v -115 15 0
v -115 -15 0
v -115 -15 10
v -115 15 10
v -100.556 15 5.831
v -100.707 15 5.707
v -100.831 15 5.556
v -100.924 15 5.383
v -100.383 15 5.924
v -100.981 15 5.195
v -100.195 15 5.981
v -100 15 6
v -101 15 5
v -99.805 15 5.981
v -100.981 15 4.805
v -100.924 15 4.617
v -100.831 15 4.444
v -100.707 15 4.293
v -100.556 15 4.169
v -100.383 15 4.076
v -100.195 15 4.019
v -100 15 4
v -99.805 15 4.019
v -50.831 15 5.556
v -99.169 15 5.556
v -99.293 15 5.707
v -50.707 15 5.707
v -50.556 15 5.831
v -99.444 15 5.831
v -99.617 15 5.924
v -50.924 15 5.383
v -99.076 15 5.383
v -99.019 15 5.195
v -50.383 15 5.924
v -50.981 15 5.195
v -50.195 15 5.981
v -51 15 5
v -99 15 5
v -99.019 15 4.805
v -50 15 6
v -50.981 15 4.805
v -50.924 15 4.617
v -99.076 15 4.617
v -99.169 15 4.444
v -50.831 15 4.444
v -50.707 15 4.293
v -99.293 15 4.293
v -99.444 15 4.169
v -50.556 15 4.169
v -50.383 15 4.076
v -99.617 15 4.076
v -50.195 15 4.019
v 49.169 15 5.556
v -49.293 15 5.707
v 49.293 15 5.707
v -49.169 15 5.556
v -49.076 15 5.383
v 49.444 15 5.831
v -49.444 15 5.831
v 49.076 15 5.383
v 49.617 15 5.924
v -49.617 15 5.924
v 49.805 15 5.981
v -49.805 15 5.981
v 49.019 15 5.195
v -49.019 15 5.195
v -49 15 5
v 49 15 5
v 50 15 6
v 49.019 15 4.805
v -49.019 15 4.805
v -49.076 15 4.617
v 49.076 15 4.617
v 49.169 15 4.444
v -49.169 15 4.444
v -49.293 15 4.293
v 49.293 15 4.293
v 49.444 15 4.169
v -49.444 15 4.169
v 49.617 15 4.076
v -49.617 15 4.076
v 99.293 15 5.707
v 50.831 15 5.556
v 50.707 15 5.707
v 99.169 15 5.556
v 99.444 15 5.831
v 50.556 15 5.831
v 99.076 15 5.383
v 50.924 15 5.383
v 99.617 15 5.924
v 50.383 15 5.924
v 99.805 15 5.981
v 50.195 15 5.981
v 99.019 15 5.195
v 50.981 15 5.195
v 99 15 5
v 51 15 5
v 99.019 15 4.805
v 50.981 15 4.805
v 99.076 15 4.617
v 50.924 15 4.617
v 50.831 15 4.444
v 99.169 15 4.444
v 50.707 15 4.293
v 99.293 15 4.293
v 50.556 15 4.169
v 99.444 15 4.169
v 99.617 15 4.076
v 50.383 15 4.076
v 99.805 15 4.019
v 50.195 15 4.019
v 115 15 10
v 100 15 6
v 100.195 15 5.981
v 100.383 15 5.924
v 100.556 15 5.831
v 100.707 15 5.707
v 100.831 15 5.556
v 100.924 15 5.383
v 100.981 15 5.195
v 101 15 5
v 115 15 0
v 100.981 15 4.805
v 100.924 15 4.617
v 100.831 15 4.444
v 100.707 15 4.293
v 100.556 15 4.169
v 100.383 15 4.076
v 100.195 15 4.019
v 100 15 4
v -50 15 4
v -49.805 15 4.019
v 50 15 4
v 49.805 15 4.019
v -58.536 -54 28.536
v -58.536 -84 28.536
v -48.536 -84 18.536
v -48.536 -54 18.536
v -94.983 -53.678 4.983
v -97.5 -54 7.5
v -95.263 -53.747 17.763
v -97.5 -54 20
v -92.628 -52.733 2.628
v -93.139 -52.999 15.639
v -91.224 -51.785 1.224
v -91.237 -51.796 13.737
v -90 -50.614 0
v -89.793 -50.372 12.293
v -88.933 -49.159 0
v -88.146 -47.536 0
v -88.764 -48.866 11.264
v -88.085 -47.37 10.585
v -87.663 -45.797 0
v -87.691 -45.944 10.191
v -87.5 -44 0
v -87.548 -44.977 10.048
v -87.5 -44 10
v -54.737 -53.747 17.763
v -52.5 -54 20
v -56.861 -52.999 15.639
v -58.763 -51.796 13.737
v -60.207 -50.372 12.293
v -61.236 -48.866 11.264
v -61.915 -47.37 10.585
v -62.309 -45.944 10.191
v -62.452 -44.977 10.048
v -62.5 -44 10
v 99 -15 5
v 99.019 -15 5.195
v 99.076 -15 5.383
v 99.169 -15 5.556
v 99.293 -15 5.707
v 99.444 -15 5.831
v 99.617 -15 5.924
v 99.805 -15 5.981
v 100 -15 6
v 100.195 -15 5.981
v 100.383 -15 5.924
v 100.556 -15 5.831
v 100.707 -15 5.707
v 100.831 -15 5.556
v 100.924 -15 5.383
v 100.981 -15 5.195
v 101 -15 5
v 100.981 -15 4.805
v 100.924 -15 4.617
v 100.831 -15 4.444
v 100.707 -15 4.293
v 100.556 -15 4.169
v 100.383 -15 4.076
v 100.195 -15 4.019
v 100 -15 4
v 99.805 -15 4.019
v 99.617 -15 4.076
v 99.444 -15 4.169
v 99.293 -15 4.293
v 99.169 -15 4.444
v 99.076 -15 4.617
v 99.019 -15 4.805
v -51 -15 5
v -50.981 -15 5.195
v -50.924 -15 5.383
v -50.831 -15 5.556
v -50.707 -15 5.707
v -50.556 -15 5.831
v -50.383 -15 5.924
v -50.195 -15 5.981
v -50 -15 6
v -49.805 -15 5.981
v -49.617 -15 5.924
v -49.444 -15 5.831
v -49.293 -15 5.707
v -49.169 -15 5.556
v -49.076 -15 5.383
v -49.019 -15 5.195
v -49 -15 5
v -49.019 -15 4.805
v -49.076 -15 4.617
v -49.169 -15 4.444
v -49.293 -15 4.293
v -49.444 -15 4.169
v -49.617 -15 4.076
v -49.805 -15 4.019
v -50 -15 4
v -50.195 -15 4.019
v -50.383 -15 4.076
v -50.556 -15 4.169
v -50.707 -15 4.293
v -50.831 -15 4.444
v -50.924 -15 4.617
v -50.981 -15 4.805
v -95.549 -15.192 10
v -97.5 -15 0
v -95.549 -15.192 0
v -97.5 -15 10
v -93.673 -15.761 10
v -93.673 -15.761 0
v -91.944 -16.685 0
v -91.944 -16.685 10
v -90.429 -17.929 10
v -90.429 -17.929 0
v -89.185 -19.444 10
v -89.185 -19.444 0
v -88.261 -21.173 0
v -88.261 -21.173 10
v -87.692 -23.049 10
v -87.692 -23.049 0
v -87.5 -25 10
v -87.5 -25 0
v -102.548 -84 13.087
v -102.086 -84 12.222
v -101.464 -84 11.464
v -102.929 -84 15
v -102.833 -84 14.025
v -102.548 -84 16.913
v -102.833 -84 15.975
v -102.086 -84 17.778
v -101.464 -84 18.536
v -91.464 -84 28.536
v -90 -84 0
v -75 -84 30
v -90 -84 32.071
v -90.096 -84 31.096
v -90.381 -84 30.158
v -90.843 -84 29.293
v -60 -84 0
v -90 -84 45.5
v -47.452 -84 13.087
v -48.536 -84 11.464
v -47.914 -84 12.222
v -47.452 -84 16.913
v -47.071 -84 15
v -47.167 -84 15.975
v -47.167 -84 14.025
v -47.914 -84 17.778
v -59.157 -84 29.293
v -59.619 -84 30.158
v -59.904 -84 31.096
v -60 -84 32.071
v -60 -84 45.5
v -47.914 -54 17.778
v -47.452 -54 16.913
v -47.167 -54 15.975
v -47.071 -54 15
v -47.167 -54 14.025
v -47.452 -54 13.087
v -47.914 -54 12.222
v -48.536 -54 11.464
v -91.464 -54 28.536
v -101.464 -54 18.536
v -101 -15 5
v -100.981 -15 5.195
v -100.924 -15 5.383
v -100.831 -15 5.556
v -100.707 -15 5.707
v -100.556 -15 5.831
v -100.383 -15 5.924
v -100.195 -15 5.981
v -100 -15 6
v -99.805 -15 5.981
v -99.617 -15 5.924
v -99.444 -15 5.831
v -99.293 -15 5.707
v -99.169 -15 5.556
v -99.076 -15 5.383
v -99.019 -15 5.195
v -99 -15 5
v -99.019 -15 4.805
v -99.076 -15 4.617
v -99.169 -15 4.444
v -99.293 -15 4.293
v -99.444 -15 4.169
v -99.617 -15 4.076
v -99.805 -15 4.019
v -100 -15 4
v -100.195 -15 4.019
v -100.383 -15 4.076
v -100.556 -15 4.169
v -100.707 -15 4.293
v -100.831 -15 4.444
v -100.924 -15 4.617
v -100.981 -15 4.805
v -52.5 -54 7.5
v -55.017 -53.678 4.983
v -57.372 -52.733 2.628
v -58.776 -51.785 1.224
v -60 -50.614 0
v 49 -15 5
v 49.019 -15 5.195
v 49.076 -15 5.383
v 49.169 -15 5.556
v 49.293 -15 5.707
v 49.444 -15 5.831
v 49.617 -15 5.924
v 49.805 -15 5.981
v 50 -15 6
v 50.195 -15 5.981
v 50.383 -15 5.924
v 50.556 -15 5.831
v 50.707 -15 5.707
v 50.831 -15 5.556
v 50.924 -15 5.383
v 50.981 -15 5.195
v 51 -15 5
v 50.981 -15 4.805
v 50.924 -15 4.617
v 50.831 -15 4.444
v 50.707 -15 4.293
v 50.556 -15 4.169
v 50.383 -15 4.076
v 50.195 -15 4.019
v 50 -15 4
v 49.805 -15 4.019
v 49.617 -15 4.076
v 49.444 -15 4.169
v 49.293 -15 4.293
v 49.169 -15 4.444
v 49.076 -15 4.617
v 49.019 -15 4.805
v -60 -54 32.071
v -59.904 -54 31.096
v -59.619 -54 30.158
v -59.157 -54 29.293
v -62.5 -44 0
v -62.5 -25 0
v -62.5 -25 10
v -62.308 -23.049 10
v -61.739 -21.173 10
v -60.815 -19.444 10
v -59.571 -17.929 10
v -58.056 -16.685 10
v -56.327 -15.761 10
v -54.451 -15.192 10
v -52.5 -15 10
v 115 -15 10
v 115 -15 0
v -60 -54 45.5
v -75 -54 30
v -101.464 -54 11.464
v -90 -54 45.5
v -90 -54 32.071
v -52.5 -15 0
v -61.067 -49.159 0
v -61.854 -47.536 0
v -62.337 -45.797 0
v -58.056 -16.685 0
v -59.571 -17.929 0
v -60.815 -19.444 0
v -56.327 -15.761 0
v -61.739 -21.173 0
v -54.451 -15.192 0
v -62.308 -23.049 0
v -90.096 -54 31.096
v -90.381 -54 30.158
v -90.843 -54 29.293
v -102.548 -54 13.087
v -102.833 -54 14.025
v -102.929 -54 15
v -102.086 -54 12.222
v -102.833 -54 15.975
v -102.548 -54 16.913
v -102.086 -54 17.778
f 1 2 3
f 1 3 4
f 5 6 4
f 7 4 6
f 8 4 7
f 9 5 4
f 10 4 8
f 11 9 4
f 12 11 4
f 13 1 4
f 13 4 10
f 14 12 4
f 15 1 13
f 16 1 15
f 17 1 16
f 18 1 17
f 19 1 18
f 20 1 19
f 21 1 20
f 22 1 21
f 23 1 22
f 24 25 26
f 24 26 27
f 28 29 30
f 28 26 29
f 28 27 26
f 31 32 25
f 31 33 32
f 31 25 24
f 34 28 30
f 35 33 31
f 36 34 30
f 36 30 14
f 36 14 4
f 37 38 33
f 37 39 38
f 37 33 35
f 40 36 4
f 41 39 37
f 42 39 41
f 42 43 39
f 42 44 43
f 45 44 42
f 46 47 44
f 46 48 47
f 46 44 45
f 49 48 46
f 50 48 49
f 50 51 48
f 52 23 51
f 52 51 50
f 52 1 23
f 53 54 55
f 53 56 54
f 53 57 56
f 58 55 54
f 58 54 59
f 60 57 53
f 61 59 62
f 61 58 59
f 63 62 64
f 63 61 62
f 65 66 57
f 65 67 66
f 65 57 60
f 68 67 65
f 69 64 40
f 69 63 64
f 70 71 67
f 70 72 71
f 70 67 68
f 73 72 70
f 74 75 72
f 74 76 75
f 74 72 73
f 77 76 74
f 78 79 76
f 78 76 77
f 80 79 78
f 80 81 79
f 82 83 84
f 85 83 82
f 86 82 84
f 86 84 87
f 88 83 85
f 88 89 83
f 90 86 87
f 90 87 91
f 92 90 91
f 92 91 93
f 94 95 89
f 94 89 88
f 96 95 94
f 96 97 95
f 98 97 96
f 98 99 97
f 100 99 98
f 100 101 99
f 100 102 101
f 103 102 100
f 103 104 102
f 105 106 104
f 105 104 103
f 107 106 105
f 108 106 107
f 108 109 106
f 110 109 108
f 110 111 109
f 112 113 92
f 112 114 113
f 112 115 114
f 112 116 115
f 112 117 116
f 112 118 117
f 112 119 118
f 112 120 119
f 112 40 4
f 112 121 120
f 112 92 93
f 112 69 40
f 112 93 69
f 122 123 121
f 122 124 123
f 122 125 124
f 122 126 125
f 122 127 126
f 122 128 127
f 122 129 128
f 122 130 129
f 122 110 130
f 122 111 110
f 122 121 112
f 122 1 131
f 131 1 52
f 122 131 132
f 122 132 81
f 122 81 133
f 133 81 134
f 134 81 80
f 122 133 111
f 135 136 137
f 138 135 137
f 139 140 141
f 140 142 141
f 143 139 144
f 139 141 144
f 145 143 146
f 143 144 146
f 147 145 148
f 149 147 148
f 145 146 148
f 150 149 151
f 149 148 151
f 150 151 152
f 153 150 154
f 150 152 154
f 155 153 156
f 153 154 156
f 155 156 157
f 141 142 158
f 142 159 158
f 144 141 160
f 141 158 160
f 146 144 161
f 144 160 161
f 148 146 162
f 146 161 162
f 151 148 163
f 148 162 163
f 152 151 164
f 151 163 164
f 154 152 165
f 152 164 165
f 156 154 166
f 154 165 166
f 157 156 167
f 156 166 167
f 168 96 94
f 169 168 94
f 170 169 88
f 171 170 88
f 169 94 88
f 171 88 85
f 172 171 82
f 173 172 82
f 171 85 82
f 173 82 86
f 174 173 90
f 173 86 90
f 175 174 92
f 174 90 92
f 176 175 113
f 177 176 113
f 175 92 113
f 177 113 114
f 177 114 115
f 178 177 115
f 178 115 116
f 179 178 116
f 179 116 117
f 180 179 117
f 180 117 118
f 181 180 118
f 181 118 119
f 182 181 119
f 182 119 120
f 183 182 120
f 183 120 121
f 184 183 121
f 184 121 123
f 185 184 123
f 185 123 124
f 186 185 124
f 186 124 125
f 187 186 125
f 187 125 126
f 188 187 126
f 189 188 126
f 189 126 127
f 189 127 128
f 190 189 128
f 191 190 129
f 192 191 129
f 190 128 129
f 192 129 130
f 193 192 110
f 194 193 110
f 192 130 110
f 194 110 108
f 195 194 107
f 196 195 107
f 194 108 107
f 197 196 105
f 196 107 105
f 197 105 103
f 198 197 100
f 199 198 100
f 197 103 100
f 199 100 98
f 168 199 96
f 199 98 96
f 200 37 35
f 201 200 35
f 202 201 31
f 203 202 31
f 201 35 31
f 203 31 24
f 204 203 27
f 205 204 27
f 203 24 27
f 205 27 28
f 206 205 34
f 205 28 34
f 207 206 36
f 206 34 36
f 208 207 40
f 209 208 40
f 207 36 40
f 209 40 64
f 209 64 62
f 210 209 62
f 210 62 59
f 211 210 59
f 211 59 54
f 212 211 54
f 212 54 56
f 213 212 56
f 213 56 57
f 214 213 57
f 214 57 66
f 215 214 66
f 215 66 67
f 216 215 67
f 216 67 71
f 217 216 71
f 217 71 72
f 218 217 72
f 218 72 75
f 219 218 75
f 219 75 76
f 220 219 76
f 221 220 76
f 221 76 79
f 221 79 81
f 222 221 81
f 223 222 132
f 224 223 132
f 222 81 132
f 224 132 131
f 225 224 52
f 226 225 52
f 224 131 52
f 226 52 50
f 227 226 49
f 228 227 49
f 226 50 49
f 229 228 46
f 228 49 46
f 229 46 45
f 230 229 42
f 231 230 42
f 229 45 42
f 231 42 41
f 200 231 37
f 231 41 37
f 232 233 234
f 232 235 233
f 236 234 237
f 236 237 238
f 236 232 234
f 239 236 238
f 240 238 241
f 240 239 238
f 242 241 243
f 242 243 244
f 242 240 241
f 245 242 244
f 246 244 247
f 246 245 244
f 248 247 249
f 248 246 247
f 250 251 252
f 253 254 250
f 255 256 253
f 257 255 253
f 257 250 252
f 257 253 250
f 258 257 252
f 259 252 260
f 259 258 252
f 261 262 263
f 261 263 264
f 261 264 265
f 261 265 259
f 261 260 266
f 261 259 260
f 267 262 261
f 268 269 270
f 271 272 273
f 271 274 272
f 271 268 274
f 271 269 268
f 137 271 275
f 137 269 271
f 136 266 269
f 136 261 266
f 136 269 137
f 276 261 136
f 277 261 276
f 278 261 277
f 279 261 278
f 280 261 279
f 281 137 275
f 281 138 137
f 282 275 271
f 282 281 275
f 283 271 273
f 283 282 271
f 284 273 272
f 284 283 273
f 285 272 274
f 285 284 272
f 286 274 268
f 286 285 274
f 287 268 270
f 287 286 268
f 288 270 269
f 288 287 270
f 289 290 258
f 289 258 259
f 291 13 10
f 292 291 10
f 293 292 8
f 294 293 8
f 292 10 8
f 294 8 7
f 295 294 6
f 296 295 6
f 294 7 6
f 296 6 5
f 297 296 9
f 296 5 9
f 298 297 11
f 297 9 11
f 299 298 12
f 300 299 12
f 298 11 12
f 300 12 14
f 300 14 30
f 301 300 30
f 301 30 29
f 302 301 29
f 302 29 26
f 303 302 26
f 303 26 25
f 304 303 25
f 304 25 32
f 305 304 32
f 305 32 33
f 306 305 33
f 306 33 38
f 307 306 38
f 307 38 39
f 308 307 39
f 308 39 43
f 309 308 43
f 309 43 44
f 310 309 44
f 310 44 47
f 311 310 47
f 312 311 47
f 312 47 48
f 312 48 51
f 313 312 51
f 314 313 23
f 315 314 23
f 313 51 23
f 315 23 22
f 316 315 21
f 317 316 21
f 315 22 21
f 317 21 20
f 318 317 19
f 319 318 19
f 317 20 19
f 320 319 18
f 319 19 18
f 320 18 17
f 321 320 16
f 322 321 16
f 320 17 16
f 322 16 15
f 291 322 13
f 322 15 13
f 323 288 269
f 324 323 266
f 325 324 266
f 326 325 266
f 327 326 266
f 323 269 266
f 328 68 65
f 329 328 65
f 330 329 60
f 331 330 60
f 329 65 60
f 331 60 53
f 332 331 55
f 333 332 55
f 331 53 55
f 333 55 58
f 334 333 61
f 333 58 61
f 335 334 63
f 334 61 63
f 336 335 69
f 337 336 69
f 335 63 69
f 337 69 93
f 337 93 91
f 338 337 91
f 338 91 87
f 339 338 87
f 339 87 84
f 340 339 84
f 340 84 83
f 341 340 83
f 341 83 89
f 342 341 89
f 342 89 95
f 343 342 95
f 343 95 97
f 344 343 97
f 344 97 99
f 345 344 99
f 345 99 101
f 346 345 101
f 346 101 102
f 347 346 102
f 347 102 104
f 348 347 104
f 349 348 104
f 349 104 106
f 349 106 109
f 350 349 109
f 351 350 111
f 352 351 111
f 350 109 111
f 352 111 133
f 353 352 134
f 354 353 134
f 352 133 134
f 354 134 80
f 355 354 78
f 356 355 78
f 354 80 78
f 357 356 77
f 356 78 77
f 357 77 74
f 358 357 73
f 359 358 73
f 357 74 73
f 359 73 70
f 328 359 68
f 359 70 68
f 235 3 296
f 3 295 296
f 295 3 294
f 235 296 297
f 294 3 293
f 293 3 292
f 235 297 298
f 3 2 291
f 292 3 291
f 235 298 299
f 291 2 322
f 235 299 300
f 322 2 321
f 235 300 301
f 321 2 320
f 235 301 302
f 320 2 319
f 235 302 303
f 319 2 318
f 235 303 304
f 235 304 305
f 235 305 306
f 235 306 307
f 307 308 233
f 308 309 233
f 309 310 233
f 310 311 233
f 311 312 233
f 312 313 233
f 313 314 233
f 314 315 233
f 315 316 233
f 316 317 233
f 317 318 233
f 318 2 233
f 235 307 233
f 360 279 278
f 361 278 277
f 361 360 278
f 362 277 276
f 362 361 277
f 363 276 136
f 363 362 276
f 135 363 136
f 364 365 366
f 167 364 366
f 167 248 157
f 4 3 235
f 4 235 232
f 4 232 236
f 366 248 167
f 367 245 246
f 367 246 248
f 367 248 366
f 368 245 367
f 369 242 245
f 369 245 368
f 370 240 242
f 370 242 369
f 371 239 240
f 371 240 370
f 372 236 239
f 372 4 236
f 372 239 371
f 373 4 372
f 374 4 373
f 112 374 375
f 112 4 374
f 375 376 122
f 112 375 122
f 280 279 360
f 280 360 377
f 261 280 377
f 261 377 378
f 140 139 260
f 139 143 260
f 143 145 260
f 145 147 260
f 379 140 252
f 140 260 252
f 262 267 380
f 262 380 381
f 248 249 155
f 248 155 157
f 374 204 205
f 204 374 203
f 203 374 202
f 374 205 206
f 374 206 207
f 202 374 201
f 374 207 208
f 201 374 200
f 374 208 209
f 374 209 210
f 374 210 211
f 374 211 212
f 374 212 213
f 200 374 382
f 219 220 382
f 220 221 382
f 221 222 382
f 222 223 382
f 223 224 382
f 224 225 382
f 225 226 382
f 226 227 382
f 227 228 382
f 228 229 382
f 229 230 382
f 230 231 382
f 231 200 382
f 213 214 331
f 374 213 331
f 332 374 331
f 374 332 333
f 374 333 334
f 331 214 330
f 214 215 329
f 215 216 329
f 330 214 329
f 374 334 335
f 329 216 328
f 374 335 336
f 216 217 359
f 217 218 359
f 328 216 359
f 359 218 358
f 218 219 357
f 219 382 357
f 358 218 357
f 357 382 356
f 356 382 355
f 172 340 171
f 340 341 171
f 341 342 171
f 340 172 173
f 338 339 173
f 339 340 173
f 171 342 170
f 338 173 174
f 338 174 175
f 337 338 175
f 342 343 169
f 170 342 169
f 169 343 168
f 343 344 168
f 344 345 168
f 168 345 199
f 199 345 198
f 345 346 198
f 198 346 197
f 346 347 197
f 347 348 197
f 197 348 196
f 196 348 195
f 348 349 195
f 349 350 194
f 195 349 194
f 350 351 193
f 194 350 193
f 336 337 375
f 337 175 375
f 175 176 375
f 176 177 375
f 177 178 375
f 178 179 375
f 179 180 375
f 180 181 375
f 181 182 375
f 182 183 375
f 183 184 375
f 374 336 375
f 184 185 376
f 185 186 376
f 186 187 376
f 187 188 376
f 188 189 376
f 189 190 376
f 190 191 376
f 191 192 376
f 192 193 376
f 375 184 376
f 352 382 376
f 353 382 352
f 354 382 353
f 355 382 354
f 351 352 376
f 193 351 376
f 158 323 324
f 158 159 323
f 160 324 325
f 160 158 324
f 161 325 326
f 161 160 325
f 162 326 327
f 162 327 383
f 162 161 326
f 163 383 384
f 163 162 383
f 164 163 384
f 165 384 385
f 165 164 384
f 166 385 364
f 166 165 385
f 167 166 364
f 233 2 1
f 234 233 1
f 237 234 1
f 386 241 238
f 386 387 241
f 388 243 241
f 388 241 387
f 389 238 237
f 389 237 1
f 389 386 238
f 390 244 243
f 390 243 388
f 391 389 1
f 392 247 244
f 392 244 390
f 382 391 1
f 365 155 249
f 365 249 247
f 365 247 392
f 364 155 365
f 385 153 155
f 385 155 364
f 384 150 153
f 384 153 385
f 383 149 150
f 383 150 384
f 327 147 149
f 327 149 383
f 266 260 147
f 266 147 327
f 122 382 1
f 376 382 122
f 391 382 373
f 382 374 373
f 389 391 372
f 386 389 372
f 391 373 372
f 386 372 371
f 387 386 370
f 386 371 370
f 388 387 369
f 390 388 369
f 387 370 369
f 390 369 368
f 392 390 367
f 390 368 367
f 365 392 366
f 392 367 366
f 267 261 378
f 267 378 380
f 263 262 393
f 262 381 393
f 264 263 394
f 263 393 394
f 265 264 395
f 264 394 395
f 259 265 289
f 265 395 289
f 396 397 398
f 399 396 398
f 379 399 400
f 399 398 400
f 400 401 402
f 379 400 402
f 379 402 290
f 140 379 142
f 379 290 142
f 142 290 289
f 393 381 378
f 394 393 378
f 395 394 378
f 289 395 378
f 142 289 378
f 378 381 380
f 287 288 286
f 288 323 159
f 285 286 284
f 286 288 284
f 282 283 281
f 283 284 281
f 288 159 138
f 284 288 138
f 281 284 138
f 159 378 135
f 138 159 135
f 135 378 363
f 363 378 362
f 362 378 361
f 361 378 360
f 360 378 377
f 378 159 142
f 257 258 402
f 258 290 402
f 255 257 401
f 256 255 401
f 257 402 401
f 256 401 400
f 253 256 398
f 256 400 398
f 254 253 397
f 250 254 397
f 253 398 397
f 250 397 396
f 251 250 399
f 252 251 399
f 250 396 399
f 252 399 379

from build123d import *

# Parameters (mm, degrees)
SKETCH1_W           = 230
SKETCH1_H           = 30
BOSS_EXTRUDE1_DEPTH = 10
SKETCH2_R           = 1
CUT_EXTRUDE1_DEPTH  = 54
SKETCH3_W           = 25
SKETCH3_H           = 10
BOSS_EXTRUDE2_DEPTH = 54
FILLET1_R           = 10
SKETCH4_W           = 60
SKETCH4_H           = 30
BOSS_EXTRUDE3_DEPTH = 15
CUT_EXTRUDE3_DEPTH  = 40
BOSS_EXTRUDE4_DEPTH = 30
FILLET2_R           = 5
FILLET3_R           = 10


with BuildPart() as part:
    # Sketch1 → Boss-Extrude1 (new body)
    with BuildSketch(Plane.XY):
        Rectangle(SKETCH1_W, SKETCH1_H)
    extrude(amount=BOSS_EXTRUDE1_DEPTH)

    # Sketch2 → Cut-Extrude1 (cut)
    with BuildSketch(Plane(origin=(0, 15, 0), x_dir=(1, 0, 0), z_dir=(0, 1, 0))):
        with Locations(Location((50, -5, 0), (0, 0, 180))):
            Circle(SKETCH2_R)
        with Locations(Location((100, -5, 0), (0, 0, 180))):
            Circle(SKETCH2_R)
        with Locations(Location((-100, -5, 0), (0, 0, 180))):
            Circle(SKETCH2_R)
        with Locations(Location((-50, -5, 0), (0, 0, 180))):
            Circle(SKETCH2_R)
    extrude(amount=-CUT_EXTRUDE1_DEPTH, mode=Mode.SUBTRACT)

    # Sketch3 → Boss-Extrude2 (add)
    with BuildSketch(Plane.XZ.offset(15)):
        with Locations((-75, 5)):
            Rectangle(SKETCH3_W, SKETCH3_H)
    extrude(amount=BOSS_EXTRUDE2_DEPTH)

    # Fillet1
    fillet1_edges = [part.edges().sort_by_distance(p)[0] for p in [
        (-87.5, -15, 5),
        (-62.5, -15, 5),
    ]]
    fillet(fillet1_edges, radius=FILLET1_R)

    # Sketch4 → Boss-Extrude3 (add, symmetric)
    with BuildSketch(Plane.XZ.offset(69)):
        with Locations((-75, 15)):
            Rectangle(SKETCH4_W, SKETCH4_H)
    extrude(amount=BOSS_EXTRUDE3_DEPTH, both=True)

    # Sketch6 → Cut-Extrude3 (cut)
    with BuildSketch(Plane.XZ.offset(84)):
        Polygon((-105, 30), (-105, 14.999997289), (-90, 30), align=None)
        Polygon((-90, 0), (-105, 14.999997289), (-105, 0), align=None)
        Polygon((-45, 30), (-60, 30), (-45, 14.999997289), align=None)
        Polygon((-45, 14.999997289), (-60, 0), (-45, 0), align=None)
    extrude(amount=-CUT_EXTRUDE3_DEPTH, mode=Mode.SUBTRACT)

    # Sketch7 → Boss-Extrude4 (add)
    with BuildSketch(Plane.XZ.offset(84)):
        Polygon((-75, 30), (-90, 45.499997289), (-90, 30), align=None)
        Polygon((-60, 45.499997289), (-75, 30), (-60, 30), align=None)
    extrude(amount=-BOSS_EXTRUDE4_DEPTH)

    # Fillet2
    fillet2_edges = [part.edges().sort_by_distance(p)[0] for p in [
        (-45, -69, 14.999997289),
        (-60, -69, 30),
        (-105, -69, 14.999997289),
        (-90, -69, 30),
    ]]
    fillet(fillet2_edges, radius=FILLET2_R)

    # Fillet3
    fillet3_edges = [part.edges().sort_by_distance(p)[0] for p in [
        (-62.5, -54, 5),
        (-87.5, -54, 5),
        (-75, -54, 10),
    ]]
    fillet(fillet3_edges, radius=FILLET3_R)


solid = part.part
